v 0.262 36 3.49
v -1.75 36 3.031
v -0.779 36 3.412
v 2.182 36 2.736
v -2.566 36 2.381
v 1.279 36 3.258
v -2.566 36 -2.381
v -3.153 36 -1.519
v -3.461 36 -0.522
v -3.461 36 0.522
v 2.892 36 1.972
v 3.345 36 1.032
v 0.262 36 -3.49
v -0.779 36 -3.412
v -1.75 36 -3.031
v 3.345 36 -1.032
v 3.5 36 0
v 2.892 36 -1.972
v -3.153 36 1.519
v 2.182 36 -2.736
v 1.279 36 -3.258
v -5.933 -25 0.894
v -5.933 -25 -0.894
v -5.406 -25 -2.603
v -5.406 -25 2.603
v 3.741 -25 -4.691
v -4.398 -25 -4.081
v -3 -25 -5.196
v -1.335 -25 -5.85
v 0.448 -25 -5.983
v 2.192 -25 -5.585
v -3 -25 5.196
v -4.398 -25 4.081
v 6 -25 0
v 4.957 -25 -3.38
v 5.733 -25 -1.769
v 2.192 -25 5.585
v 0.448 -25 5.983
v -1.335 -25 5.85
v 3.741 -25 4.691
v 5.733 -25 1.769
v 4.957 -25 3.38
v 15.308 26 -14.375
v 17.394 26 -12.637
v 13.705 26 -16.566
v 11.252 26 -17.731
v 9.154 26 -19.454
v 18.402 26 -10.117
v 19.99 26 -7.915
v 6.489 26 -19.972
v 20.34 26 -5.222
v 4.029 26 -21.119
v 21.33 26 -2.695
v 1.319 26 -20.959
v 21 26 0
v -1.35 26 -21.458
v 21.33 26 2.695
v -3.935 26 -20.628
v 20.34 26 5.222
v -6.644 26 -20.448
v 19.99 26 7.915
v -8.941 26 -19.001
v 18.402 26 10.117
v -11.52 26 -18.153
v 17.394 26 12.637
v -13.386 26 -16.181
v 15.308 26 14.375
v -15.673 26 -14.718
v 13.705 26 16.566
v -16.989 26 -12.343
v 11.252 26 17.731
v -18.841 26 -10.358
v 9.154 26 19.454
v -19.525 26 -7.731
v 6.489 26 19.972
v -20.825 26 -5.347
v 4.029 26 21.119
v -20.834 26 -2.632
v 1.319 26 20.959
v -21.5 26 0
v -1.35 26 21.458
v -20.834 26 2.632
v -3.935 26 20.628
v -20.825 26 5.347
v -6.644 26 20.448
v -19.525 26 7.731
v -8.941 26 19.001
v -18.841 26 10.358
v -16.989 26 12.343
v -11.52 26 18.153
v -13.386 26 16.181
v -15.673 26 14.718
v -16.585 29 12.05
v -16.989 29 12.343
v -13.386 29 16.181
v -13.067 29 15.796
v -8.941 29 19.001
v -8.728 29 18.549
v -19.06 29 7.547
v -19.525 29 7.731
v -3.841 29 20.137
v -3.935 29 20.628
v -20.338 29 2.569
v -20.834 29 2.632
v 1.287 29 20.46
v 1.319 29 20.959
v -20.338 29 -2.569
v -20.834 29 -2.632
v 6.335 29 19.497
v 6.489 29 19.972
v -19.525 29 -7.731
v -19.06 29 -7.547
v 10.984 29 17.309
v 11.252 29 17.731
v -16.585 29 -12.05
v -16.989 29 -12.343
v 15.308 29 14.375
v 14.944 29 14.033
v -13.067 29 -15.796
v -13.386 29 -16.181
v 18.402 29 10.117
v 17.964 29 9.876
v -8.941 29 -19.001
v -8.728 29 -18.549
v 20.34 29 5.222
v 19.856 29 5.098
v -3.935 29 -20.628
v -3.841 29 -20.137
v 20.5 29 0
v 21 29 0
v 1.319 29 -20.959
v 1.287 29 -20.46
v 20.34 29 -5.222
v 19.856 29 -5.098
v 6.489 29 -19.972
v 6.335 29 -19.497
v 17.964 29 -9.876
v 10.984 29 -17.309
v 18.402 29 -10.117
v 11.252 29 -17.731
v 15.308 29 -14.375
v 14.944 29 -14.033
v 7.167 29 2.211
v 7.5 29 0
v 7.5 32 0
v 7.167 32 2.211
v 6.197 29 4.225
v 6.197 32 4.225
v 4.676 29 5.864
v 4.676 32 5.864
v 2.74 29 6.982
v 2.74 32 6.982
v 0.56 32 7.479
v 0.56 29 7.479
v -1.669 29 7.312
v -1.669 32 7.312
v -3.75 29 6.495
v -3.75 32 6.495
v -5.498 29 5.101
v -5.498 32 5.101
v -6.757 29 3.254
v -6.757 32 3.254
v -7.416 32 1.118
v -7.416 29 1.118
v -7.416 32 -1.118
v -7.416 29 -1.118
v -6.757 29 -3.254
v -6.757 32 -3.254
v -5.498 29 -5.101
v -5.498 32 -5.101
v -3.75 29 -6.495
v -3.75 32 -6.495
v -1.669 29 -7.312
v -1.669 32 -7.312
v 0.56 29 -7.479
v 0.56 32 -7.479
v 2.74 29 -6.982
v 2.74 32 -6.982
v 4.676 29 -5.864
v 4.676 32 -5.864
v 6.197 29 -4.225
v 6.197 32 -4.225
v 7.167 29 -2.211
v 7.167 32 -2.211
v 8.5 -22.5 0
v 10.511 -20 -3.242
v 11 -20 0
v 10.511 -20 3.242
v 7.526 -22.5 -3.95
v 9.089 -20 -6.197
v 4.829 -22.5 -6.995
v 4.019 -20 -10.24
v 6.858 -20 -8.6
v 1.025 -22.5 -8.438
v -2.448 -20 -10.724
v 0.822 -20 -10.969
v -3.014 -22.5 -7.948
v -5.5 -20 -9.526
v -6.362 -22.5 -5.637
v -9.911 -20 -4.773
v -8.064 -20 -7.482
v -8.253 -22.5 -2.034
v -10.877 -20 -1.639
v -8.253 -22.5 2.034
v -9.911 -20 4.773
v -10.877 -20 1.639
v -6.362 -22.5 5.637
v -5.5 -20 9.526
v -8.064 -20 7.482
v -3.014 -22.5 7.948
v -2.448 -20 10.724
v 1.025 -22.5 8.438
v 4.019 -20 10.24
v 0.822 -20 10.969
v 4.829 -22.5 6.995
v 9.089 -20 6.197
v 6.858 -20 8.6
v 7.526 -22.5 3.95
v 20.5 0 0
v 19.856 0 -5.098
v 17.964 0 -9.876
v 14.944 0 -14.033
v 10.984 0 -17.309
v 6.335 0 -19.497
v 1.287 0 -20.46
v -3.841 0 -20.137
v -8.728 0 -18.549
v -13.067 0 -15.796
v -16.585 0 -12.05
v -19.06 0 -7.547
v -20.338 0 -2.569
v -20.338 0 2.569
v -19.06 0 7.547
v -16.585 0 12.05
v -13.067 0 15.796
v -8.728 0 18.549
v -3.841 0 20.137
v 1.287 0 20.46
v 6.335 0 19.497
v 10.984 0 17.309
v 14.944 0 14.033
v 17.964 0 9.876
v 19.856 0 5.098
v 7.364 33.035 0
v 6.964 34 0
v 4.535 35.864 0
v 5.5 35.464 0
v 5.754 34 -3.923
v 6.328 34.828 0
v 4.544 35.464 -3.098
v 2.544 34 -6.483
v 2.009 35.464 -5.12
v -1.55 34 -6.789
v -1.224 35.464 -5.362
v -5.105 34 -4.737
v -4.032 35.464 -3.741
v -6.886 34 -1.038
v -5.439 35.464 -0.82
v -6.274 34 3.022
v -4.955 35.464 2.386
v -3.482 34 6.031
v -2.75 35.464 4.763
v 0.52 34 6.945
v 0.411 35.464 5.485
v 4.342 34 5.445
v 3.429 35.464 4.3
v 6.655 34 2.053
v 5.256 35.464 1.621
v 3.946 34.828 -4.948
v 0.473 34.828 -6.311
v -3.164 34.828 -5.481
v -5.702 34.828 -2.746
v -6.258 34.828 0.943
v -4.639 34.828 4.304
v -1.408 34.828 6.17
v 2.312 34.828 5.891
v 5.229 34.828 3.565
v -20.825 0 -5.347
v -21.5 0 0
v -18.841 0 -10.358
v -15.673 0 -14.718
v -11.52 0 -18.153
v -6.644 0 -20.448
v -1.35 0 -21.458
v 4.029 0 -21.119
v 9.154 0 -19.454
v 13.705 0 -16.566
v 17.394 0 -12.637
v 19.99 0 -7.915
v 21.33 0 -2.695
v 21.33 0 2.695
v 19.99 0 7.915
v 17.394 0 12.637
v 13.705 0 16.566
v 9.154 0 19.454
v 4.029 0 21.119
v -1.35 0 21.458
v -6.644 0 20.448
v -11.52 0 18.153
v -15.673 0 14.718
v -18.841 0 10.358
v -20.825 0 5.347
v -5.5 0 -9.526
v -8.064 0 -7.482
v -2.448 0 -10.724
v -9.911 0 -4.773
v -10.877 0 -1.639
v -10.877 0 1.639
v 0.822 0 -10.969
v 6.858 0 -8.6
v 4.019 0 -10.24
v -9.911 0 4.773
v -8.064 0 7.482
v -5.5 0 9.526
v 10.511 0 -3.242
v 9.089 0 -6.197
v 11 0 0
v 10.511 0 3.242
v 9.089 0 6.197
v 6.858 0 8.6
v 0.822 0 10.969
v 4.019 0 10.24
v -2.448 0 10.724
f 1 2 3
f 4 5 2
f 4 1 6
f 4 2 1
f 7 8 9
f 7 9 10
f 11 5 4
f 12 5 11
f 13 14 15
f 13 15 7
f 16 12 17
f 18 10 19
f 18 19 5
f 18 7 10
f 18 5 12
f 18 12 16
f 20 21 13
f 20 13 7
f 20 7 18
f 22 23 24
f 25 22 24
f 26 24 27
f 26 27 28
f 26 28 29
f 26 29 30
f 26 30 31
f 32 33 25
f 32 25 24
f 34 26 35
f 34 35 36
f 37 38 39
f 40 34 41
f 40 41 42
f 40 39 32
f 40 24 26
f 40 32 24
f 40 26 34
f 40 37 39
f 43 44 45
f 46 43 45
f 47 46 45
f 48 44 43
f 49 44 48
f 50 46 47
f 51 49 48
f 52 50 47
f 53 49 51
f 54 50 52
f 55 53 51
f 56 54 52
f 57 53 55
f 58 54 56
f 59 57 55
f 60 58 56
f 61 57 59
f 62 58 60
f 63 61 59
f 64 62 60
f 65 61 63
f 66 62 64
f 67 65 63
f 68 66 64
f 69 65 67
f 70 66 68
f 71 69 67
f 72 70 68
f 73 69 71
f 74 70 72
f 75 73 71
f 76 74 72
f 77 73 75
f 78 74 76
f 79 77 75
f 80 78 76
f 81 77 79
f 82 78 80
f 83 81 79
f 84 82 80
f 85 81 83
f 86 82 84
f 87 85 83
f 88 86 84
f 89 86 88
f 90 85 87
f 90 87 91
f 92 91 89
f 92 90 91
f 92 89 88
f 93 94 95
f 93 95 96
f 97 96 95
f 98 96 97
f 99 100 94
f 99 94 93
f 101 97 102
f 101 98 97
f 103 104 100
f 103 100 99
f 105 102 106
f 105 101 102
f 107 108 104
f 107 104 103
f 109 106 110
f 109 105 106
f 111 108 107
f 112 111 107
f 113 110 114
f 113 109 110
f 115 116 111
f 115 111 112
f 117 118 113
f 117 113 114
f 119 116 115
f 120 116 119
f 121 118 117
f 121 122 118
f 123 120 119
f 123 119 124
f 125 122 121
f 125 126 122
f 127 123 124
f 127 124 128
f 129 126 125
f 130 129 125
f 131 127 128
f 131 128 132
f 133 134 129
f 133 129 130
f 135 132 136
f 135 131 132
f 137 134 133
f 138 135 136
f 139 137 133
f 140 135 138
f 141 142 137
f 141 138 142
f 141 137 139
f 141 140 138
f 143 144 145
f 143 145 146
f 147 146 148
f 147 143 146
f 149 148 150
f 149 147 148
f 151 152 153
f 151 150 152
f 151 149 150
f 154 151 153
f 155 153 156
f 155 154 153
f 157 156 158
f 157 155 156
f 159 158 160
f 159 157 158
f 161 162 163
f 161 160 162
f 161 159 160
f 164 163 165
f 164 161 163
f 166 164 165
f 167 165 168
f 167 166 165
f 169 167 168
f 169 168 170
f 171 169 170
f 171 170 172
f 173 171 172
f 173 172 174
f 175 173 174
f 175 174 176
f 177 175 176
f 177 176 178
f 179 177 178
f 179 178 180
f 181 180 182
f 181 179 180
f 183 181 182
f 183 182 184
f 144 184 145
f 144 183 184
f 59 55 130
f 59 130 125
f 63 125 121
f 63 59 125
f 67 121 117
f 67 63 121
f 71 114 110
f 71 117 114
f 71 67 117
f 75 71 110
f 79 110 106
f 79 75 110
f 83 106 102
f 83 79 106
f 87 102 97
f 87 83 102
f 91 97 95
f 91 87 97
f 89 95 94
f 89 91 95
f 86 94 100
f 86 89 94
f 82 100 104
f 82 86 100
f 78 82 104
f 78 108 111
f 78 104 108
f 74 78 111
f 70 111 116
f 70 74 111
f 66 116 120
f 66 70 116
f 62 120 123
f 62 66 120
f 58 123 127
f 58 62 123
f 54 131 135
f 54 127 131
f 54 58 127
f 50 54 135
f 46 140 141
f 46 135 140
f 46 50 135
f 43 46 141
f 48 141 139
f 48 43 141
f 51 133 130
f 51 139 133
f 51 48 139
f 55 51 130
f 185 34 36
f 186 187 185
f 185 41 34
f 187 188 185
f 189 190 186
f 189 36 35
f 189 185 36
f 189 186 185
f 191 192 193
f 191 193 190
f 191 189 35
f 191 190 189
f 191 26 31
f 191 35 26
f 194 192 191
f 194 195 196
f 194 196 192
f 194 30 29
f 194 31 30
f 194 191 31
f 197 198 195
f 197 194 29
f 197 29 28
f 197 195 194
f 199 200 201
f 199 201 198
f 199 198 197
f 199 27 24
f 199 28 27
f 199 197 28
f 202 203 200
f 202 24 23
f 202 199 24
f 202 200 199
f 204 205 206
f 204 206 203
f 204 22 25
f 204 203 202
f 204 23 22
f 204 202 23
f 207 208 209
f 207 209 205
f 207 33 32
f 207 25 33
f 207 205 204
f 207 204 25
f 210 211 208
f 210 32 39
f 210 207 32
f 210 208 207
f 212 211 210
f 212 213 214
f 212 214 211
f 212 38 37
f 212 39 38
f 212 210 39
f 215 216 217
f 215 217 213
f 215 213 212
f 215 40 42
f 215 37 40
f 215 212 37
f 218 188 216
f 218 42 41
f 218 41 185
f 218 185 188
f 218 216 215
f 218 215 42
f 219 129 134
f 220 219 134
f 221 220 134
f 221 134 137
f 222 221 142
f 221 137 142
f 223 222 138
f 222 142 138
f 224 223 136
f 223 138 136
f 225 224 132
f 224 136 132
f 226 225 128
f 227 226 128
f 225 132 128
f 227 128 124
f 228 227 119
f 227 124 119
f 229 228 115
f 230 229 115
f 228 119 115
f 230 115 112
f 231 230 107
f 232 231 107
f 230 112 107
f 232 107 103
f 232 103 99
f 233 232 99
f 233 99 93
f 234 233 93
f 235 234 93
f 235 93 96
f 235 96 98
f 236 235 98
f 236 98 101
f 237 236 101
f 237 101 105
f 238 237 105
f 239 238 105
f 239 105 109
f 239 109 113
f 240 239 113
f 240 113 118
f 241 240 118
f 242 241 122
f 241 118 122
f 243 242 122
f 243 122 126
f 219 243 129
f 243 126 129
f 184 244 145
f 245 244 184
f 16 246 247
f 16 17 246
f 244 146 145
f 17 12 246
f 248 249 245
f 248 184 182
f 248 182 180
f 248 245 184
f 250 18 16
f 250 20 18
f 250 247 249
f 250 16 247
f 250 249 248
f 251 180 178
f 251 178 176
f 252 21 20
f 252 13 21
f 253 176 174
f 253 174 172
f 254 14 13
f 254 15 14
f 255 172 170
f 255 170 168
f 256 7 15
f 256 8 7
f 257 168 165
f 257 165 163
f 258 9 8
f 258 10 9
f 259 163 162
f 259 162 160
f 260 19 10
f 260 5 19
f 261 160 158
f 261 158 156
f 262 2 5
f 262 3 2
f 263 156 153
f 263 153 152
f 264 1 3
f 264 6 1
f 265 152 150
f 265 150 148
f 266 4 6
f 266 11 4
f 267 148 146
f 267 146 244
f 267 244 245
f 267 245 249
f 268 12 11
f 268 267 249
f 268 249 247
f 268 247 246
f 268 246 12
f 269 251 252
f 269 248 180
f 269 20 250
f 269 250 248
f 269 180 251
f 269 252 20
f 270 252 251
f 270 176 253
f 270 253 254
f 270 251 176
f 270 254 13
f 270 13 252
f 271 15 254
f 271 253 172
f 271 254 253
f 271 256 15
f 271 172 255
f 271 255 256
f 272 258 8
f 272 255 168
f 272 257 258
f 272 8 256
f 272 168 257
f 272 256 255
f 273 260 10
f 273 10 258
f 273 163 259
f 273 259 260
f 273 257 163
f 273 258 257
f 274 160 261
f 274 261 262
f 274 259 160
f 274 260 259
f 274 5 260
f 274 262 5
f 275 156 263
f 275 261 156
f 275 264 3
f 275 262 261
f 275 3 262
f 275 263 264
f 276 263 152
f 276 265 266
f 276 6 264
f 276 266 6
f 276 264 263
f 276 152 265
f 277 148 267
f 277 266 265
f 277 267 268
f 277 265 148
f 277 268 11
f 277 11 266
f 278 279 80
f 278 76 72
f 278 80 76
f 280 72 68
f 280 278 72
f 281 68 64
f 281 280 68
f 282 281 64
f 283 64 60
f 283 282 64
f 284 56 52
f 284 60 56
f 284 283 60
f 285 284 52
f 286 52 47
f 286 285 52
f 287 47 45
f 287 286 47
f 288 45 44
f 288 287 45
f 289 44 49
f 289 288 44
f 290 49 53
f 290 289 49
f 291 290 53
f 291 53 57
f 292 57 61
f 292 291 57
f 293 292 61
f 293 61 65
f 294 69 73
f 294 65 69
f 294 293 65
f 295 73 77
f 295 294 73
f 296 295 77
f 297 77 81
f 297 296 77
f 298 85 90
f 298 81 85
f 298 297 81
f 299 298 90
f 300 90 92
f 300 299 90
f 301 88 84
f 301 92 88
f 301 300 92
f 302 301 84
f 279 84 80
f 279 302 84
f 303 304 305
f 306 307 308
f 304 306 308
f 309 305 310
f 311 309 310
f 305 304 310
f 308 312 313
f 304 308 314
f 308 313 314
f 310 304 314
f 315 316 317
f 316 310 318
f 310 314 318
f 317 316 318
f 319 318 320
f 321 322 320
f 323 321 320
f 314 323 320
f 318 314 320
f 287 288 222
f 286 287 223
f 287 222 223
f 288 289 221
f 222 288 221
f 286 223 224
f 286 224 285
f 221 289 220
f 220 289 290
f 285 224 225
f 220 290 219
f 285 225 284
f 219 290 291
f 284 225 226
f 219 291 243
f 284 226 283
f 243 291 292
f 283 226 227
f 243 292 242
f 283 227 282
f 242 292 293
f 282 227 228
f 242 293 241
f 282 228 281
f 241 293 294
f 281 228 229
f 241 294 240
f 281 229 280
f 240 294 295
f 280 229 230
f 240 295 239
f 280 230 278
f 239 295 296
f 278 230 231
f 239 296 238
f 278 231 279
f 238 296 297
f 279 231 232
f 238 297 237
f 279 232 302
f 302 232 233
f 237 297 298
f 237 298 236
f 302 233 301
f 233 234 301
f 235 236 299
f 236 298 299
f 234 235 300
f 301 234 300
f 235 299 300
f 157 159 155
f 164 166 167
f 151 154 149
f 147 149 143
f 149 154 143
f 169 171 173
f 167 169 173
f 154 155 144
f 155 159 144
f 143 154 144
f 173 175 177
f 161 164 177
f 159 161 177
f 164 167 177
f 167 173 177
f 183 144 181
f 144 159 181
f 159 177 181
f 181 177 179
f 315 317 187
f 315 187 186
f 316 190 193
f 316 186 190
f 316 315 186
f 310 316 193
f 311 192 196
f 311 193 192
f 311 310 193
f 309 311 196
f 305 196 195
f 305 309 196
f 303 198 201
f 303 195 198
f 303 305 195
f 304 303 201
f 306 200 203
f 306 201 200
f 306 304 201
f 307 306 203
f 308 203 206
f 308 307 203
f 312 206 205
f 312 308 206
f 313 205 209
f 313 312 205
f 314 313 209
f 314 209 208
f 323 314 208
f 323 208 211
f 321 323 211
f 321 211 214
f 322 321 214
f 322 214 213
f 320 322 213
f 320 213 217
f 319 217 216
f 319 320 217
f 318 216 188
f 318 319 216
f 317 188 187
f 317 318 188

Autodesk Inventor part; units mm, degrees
ref_plane "XZ Plane" through (0, 0, 0) normal (0, 1, 0) x (-1, 0, 0)
ref_plane "XY Plane" through (0, 0, 0) normal (0, 0, 1) x (1, 0, 0)
sketch "Sketch1" plane through (0, 0, 0) normal (0, 1, 0) x (-1, 0, 0)
  circle A0 centre (0, 0) radius 21.5
  dimension "d0" = 43
extrude "Extrusion1" add sketch "Sketch1" along normal blind 26
sketch "Sketch2" plane through (0, 26, 0) normal (0, 1, 0) x (1, 0, 0)
  circle A0 centre (0, 0) radius 21
  dimension "d3" = 42
extrude "Extrusion2" add sketch "Sketch2" along normal blind 3
sketch "Sketch3" plane through (0, 29, 0) normal (0, 1, 0) x (1, 0, 0)
  circle A0 centre (0, 0) radius 20.5
  dimension "d6" = 41
extrude "Extrusion3" cut sketch "Sketch3" against normal blind 29
sketch "Sketch4" plane through (0, 29, 0) normal (0, 1, 0) x (1, 0, 0)
  circle A0 centre (0, 0) radius 7.5
  dimension "d9" = 15
extrude "Extrusion4" add sketch "Sketch4" along normal blind 7
fillet "Fillet1" radius 4 1 edges at (-7.5, 36, 0)
sketch "Sketch5" plane through (0, 0, 0) normal (0, -1, 0) x (1, 0, 0)
  circle A0 centre (0, 0) radius 11
  dimension "d13" = 22
extrude "Extrusion5" add sketch "Sketch5" along normal blind 25
chamfer "Chamfer1" distance 5 angle 45 1 edges at (-11, -25, 0)
ref_plane "Work Plane1" through (0, 0, 0) normal (1, 0, 0) x (0, 1, 0)
properties part number "RACESTAR"
